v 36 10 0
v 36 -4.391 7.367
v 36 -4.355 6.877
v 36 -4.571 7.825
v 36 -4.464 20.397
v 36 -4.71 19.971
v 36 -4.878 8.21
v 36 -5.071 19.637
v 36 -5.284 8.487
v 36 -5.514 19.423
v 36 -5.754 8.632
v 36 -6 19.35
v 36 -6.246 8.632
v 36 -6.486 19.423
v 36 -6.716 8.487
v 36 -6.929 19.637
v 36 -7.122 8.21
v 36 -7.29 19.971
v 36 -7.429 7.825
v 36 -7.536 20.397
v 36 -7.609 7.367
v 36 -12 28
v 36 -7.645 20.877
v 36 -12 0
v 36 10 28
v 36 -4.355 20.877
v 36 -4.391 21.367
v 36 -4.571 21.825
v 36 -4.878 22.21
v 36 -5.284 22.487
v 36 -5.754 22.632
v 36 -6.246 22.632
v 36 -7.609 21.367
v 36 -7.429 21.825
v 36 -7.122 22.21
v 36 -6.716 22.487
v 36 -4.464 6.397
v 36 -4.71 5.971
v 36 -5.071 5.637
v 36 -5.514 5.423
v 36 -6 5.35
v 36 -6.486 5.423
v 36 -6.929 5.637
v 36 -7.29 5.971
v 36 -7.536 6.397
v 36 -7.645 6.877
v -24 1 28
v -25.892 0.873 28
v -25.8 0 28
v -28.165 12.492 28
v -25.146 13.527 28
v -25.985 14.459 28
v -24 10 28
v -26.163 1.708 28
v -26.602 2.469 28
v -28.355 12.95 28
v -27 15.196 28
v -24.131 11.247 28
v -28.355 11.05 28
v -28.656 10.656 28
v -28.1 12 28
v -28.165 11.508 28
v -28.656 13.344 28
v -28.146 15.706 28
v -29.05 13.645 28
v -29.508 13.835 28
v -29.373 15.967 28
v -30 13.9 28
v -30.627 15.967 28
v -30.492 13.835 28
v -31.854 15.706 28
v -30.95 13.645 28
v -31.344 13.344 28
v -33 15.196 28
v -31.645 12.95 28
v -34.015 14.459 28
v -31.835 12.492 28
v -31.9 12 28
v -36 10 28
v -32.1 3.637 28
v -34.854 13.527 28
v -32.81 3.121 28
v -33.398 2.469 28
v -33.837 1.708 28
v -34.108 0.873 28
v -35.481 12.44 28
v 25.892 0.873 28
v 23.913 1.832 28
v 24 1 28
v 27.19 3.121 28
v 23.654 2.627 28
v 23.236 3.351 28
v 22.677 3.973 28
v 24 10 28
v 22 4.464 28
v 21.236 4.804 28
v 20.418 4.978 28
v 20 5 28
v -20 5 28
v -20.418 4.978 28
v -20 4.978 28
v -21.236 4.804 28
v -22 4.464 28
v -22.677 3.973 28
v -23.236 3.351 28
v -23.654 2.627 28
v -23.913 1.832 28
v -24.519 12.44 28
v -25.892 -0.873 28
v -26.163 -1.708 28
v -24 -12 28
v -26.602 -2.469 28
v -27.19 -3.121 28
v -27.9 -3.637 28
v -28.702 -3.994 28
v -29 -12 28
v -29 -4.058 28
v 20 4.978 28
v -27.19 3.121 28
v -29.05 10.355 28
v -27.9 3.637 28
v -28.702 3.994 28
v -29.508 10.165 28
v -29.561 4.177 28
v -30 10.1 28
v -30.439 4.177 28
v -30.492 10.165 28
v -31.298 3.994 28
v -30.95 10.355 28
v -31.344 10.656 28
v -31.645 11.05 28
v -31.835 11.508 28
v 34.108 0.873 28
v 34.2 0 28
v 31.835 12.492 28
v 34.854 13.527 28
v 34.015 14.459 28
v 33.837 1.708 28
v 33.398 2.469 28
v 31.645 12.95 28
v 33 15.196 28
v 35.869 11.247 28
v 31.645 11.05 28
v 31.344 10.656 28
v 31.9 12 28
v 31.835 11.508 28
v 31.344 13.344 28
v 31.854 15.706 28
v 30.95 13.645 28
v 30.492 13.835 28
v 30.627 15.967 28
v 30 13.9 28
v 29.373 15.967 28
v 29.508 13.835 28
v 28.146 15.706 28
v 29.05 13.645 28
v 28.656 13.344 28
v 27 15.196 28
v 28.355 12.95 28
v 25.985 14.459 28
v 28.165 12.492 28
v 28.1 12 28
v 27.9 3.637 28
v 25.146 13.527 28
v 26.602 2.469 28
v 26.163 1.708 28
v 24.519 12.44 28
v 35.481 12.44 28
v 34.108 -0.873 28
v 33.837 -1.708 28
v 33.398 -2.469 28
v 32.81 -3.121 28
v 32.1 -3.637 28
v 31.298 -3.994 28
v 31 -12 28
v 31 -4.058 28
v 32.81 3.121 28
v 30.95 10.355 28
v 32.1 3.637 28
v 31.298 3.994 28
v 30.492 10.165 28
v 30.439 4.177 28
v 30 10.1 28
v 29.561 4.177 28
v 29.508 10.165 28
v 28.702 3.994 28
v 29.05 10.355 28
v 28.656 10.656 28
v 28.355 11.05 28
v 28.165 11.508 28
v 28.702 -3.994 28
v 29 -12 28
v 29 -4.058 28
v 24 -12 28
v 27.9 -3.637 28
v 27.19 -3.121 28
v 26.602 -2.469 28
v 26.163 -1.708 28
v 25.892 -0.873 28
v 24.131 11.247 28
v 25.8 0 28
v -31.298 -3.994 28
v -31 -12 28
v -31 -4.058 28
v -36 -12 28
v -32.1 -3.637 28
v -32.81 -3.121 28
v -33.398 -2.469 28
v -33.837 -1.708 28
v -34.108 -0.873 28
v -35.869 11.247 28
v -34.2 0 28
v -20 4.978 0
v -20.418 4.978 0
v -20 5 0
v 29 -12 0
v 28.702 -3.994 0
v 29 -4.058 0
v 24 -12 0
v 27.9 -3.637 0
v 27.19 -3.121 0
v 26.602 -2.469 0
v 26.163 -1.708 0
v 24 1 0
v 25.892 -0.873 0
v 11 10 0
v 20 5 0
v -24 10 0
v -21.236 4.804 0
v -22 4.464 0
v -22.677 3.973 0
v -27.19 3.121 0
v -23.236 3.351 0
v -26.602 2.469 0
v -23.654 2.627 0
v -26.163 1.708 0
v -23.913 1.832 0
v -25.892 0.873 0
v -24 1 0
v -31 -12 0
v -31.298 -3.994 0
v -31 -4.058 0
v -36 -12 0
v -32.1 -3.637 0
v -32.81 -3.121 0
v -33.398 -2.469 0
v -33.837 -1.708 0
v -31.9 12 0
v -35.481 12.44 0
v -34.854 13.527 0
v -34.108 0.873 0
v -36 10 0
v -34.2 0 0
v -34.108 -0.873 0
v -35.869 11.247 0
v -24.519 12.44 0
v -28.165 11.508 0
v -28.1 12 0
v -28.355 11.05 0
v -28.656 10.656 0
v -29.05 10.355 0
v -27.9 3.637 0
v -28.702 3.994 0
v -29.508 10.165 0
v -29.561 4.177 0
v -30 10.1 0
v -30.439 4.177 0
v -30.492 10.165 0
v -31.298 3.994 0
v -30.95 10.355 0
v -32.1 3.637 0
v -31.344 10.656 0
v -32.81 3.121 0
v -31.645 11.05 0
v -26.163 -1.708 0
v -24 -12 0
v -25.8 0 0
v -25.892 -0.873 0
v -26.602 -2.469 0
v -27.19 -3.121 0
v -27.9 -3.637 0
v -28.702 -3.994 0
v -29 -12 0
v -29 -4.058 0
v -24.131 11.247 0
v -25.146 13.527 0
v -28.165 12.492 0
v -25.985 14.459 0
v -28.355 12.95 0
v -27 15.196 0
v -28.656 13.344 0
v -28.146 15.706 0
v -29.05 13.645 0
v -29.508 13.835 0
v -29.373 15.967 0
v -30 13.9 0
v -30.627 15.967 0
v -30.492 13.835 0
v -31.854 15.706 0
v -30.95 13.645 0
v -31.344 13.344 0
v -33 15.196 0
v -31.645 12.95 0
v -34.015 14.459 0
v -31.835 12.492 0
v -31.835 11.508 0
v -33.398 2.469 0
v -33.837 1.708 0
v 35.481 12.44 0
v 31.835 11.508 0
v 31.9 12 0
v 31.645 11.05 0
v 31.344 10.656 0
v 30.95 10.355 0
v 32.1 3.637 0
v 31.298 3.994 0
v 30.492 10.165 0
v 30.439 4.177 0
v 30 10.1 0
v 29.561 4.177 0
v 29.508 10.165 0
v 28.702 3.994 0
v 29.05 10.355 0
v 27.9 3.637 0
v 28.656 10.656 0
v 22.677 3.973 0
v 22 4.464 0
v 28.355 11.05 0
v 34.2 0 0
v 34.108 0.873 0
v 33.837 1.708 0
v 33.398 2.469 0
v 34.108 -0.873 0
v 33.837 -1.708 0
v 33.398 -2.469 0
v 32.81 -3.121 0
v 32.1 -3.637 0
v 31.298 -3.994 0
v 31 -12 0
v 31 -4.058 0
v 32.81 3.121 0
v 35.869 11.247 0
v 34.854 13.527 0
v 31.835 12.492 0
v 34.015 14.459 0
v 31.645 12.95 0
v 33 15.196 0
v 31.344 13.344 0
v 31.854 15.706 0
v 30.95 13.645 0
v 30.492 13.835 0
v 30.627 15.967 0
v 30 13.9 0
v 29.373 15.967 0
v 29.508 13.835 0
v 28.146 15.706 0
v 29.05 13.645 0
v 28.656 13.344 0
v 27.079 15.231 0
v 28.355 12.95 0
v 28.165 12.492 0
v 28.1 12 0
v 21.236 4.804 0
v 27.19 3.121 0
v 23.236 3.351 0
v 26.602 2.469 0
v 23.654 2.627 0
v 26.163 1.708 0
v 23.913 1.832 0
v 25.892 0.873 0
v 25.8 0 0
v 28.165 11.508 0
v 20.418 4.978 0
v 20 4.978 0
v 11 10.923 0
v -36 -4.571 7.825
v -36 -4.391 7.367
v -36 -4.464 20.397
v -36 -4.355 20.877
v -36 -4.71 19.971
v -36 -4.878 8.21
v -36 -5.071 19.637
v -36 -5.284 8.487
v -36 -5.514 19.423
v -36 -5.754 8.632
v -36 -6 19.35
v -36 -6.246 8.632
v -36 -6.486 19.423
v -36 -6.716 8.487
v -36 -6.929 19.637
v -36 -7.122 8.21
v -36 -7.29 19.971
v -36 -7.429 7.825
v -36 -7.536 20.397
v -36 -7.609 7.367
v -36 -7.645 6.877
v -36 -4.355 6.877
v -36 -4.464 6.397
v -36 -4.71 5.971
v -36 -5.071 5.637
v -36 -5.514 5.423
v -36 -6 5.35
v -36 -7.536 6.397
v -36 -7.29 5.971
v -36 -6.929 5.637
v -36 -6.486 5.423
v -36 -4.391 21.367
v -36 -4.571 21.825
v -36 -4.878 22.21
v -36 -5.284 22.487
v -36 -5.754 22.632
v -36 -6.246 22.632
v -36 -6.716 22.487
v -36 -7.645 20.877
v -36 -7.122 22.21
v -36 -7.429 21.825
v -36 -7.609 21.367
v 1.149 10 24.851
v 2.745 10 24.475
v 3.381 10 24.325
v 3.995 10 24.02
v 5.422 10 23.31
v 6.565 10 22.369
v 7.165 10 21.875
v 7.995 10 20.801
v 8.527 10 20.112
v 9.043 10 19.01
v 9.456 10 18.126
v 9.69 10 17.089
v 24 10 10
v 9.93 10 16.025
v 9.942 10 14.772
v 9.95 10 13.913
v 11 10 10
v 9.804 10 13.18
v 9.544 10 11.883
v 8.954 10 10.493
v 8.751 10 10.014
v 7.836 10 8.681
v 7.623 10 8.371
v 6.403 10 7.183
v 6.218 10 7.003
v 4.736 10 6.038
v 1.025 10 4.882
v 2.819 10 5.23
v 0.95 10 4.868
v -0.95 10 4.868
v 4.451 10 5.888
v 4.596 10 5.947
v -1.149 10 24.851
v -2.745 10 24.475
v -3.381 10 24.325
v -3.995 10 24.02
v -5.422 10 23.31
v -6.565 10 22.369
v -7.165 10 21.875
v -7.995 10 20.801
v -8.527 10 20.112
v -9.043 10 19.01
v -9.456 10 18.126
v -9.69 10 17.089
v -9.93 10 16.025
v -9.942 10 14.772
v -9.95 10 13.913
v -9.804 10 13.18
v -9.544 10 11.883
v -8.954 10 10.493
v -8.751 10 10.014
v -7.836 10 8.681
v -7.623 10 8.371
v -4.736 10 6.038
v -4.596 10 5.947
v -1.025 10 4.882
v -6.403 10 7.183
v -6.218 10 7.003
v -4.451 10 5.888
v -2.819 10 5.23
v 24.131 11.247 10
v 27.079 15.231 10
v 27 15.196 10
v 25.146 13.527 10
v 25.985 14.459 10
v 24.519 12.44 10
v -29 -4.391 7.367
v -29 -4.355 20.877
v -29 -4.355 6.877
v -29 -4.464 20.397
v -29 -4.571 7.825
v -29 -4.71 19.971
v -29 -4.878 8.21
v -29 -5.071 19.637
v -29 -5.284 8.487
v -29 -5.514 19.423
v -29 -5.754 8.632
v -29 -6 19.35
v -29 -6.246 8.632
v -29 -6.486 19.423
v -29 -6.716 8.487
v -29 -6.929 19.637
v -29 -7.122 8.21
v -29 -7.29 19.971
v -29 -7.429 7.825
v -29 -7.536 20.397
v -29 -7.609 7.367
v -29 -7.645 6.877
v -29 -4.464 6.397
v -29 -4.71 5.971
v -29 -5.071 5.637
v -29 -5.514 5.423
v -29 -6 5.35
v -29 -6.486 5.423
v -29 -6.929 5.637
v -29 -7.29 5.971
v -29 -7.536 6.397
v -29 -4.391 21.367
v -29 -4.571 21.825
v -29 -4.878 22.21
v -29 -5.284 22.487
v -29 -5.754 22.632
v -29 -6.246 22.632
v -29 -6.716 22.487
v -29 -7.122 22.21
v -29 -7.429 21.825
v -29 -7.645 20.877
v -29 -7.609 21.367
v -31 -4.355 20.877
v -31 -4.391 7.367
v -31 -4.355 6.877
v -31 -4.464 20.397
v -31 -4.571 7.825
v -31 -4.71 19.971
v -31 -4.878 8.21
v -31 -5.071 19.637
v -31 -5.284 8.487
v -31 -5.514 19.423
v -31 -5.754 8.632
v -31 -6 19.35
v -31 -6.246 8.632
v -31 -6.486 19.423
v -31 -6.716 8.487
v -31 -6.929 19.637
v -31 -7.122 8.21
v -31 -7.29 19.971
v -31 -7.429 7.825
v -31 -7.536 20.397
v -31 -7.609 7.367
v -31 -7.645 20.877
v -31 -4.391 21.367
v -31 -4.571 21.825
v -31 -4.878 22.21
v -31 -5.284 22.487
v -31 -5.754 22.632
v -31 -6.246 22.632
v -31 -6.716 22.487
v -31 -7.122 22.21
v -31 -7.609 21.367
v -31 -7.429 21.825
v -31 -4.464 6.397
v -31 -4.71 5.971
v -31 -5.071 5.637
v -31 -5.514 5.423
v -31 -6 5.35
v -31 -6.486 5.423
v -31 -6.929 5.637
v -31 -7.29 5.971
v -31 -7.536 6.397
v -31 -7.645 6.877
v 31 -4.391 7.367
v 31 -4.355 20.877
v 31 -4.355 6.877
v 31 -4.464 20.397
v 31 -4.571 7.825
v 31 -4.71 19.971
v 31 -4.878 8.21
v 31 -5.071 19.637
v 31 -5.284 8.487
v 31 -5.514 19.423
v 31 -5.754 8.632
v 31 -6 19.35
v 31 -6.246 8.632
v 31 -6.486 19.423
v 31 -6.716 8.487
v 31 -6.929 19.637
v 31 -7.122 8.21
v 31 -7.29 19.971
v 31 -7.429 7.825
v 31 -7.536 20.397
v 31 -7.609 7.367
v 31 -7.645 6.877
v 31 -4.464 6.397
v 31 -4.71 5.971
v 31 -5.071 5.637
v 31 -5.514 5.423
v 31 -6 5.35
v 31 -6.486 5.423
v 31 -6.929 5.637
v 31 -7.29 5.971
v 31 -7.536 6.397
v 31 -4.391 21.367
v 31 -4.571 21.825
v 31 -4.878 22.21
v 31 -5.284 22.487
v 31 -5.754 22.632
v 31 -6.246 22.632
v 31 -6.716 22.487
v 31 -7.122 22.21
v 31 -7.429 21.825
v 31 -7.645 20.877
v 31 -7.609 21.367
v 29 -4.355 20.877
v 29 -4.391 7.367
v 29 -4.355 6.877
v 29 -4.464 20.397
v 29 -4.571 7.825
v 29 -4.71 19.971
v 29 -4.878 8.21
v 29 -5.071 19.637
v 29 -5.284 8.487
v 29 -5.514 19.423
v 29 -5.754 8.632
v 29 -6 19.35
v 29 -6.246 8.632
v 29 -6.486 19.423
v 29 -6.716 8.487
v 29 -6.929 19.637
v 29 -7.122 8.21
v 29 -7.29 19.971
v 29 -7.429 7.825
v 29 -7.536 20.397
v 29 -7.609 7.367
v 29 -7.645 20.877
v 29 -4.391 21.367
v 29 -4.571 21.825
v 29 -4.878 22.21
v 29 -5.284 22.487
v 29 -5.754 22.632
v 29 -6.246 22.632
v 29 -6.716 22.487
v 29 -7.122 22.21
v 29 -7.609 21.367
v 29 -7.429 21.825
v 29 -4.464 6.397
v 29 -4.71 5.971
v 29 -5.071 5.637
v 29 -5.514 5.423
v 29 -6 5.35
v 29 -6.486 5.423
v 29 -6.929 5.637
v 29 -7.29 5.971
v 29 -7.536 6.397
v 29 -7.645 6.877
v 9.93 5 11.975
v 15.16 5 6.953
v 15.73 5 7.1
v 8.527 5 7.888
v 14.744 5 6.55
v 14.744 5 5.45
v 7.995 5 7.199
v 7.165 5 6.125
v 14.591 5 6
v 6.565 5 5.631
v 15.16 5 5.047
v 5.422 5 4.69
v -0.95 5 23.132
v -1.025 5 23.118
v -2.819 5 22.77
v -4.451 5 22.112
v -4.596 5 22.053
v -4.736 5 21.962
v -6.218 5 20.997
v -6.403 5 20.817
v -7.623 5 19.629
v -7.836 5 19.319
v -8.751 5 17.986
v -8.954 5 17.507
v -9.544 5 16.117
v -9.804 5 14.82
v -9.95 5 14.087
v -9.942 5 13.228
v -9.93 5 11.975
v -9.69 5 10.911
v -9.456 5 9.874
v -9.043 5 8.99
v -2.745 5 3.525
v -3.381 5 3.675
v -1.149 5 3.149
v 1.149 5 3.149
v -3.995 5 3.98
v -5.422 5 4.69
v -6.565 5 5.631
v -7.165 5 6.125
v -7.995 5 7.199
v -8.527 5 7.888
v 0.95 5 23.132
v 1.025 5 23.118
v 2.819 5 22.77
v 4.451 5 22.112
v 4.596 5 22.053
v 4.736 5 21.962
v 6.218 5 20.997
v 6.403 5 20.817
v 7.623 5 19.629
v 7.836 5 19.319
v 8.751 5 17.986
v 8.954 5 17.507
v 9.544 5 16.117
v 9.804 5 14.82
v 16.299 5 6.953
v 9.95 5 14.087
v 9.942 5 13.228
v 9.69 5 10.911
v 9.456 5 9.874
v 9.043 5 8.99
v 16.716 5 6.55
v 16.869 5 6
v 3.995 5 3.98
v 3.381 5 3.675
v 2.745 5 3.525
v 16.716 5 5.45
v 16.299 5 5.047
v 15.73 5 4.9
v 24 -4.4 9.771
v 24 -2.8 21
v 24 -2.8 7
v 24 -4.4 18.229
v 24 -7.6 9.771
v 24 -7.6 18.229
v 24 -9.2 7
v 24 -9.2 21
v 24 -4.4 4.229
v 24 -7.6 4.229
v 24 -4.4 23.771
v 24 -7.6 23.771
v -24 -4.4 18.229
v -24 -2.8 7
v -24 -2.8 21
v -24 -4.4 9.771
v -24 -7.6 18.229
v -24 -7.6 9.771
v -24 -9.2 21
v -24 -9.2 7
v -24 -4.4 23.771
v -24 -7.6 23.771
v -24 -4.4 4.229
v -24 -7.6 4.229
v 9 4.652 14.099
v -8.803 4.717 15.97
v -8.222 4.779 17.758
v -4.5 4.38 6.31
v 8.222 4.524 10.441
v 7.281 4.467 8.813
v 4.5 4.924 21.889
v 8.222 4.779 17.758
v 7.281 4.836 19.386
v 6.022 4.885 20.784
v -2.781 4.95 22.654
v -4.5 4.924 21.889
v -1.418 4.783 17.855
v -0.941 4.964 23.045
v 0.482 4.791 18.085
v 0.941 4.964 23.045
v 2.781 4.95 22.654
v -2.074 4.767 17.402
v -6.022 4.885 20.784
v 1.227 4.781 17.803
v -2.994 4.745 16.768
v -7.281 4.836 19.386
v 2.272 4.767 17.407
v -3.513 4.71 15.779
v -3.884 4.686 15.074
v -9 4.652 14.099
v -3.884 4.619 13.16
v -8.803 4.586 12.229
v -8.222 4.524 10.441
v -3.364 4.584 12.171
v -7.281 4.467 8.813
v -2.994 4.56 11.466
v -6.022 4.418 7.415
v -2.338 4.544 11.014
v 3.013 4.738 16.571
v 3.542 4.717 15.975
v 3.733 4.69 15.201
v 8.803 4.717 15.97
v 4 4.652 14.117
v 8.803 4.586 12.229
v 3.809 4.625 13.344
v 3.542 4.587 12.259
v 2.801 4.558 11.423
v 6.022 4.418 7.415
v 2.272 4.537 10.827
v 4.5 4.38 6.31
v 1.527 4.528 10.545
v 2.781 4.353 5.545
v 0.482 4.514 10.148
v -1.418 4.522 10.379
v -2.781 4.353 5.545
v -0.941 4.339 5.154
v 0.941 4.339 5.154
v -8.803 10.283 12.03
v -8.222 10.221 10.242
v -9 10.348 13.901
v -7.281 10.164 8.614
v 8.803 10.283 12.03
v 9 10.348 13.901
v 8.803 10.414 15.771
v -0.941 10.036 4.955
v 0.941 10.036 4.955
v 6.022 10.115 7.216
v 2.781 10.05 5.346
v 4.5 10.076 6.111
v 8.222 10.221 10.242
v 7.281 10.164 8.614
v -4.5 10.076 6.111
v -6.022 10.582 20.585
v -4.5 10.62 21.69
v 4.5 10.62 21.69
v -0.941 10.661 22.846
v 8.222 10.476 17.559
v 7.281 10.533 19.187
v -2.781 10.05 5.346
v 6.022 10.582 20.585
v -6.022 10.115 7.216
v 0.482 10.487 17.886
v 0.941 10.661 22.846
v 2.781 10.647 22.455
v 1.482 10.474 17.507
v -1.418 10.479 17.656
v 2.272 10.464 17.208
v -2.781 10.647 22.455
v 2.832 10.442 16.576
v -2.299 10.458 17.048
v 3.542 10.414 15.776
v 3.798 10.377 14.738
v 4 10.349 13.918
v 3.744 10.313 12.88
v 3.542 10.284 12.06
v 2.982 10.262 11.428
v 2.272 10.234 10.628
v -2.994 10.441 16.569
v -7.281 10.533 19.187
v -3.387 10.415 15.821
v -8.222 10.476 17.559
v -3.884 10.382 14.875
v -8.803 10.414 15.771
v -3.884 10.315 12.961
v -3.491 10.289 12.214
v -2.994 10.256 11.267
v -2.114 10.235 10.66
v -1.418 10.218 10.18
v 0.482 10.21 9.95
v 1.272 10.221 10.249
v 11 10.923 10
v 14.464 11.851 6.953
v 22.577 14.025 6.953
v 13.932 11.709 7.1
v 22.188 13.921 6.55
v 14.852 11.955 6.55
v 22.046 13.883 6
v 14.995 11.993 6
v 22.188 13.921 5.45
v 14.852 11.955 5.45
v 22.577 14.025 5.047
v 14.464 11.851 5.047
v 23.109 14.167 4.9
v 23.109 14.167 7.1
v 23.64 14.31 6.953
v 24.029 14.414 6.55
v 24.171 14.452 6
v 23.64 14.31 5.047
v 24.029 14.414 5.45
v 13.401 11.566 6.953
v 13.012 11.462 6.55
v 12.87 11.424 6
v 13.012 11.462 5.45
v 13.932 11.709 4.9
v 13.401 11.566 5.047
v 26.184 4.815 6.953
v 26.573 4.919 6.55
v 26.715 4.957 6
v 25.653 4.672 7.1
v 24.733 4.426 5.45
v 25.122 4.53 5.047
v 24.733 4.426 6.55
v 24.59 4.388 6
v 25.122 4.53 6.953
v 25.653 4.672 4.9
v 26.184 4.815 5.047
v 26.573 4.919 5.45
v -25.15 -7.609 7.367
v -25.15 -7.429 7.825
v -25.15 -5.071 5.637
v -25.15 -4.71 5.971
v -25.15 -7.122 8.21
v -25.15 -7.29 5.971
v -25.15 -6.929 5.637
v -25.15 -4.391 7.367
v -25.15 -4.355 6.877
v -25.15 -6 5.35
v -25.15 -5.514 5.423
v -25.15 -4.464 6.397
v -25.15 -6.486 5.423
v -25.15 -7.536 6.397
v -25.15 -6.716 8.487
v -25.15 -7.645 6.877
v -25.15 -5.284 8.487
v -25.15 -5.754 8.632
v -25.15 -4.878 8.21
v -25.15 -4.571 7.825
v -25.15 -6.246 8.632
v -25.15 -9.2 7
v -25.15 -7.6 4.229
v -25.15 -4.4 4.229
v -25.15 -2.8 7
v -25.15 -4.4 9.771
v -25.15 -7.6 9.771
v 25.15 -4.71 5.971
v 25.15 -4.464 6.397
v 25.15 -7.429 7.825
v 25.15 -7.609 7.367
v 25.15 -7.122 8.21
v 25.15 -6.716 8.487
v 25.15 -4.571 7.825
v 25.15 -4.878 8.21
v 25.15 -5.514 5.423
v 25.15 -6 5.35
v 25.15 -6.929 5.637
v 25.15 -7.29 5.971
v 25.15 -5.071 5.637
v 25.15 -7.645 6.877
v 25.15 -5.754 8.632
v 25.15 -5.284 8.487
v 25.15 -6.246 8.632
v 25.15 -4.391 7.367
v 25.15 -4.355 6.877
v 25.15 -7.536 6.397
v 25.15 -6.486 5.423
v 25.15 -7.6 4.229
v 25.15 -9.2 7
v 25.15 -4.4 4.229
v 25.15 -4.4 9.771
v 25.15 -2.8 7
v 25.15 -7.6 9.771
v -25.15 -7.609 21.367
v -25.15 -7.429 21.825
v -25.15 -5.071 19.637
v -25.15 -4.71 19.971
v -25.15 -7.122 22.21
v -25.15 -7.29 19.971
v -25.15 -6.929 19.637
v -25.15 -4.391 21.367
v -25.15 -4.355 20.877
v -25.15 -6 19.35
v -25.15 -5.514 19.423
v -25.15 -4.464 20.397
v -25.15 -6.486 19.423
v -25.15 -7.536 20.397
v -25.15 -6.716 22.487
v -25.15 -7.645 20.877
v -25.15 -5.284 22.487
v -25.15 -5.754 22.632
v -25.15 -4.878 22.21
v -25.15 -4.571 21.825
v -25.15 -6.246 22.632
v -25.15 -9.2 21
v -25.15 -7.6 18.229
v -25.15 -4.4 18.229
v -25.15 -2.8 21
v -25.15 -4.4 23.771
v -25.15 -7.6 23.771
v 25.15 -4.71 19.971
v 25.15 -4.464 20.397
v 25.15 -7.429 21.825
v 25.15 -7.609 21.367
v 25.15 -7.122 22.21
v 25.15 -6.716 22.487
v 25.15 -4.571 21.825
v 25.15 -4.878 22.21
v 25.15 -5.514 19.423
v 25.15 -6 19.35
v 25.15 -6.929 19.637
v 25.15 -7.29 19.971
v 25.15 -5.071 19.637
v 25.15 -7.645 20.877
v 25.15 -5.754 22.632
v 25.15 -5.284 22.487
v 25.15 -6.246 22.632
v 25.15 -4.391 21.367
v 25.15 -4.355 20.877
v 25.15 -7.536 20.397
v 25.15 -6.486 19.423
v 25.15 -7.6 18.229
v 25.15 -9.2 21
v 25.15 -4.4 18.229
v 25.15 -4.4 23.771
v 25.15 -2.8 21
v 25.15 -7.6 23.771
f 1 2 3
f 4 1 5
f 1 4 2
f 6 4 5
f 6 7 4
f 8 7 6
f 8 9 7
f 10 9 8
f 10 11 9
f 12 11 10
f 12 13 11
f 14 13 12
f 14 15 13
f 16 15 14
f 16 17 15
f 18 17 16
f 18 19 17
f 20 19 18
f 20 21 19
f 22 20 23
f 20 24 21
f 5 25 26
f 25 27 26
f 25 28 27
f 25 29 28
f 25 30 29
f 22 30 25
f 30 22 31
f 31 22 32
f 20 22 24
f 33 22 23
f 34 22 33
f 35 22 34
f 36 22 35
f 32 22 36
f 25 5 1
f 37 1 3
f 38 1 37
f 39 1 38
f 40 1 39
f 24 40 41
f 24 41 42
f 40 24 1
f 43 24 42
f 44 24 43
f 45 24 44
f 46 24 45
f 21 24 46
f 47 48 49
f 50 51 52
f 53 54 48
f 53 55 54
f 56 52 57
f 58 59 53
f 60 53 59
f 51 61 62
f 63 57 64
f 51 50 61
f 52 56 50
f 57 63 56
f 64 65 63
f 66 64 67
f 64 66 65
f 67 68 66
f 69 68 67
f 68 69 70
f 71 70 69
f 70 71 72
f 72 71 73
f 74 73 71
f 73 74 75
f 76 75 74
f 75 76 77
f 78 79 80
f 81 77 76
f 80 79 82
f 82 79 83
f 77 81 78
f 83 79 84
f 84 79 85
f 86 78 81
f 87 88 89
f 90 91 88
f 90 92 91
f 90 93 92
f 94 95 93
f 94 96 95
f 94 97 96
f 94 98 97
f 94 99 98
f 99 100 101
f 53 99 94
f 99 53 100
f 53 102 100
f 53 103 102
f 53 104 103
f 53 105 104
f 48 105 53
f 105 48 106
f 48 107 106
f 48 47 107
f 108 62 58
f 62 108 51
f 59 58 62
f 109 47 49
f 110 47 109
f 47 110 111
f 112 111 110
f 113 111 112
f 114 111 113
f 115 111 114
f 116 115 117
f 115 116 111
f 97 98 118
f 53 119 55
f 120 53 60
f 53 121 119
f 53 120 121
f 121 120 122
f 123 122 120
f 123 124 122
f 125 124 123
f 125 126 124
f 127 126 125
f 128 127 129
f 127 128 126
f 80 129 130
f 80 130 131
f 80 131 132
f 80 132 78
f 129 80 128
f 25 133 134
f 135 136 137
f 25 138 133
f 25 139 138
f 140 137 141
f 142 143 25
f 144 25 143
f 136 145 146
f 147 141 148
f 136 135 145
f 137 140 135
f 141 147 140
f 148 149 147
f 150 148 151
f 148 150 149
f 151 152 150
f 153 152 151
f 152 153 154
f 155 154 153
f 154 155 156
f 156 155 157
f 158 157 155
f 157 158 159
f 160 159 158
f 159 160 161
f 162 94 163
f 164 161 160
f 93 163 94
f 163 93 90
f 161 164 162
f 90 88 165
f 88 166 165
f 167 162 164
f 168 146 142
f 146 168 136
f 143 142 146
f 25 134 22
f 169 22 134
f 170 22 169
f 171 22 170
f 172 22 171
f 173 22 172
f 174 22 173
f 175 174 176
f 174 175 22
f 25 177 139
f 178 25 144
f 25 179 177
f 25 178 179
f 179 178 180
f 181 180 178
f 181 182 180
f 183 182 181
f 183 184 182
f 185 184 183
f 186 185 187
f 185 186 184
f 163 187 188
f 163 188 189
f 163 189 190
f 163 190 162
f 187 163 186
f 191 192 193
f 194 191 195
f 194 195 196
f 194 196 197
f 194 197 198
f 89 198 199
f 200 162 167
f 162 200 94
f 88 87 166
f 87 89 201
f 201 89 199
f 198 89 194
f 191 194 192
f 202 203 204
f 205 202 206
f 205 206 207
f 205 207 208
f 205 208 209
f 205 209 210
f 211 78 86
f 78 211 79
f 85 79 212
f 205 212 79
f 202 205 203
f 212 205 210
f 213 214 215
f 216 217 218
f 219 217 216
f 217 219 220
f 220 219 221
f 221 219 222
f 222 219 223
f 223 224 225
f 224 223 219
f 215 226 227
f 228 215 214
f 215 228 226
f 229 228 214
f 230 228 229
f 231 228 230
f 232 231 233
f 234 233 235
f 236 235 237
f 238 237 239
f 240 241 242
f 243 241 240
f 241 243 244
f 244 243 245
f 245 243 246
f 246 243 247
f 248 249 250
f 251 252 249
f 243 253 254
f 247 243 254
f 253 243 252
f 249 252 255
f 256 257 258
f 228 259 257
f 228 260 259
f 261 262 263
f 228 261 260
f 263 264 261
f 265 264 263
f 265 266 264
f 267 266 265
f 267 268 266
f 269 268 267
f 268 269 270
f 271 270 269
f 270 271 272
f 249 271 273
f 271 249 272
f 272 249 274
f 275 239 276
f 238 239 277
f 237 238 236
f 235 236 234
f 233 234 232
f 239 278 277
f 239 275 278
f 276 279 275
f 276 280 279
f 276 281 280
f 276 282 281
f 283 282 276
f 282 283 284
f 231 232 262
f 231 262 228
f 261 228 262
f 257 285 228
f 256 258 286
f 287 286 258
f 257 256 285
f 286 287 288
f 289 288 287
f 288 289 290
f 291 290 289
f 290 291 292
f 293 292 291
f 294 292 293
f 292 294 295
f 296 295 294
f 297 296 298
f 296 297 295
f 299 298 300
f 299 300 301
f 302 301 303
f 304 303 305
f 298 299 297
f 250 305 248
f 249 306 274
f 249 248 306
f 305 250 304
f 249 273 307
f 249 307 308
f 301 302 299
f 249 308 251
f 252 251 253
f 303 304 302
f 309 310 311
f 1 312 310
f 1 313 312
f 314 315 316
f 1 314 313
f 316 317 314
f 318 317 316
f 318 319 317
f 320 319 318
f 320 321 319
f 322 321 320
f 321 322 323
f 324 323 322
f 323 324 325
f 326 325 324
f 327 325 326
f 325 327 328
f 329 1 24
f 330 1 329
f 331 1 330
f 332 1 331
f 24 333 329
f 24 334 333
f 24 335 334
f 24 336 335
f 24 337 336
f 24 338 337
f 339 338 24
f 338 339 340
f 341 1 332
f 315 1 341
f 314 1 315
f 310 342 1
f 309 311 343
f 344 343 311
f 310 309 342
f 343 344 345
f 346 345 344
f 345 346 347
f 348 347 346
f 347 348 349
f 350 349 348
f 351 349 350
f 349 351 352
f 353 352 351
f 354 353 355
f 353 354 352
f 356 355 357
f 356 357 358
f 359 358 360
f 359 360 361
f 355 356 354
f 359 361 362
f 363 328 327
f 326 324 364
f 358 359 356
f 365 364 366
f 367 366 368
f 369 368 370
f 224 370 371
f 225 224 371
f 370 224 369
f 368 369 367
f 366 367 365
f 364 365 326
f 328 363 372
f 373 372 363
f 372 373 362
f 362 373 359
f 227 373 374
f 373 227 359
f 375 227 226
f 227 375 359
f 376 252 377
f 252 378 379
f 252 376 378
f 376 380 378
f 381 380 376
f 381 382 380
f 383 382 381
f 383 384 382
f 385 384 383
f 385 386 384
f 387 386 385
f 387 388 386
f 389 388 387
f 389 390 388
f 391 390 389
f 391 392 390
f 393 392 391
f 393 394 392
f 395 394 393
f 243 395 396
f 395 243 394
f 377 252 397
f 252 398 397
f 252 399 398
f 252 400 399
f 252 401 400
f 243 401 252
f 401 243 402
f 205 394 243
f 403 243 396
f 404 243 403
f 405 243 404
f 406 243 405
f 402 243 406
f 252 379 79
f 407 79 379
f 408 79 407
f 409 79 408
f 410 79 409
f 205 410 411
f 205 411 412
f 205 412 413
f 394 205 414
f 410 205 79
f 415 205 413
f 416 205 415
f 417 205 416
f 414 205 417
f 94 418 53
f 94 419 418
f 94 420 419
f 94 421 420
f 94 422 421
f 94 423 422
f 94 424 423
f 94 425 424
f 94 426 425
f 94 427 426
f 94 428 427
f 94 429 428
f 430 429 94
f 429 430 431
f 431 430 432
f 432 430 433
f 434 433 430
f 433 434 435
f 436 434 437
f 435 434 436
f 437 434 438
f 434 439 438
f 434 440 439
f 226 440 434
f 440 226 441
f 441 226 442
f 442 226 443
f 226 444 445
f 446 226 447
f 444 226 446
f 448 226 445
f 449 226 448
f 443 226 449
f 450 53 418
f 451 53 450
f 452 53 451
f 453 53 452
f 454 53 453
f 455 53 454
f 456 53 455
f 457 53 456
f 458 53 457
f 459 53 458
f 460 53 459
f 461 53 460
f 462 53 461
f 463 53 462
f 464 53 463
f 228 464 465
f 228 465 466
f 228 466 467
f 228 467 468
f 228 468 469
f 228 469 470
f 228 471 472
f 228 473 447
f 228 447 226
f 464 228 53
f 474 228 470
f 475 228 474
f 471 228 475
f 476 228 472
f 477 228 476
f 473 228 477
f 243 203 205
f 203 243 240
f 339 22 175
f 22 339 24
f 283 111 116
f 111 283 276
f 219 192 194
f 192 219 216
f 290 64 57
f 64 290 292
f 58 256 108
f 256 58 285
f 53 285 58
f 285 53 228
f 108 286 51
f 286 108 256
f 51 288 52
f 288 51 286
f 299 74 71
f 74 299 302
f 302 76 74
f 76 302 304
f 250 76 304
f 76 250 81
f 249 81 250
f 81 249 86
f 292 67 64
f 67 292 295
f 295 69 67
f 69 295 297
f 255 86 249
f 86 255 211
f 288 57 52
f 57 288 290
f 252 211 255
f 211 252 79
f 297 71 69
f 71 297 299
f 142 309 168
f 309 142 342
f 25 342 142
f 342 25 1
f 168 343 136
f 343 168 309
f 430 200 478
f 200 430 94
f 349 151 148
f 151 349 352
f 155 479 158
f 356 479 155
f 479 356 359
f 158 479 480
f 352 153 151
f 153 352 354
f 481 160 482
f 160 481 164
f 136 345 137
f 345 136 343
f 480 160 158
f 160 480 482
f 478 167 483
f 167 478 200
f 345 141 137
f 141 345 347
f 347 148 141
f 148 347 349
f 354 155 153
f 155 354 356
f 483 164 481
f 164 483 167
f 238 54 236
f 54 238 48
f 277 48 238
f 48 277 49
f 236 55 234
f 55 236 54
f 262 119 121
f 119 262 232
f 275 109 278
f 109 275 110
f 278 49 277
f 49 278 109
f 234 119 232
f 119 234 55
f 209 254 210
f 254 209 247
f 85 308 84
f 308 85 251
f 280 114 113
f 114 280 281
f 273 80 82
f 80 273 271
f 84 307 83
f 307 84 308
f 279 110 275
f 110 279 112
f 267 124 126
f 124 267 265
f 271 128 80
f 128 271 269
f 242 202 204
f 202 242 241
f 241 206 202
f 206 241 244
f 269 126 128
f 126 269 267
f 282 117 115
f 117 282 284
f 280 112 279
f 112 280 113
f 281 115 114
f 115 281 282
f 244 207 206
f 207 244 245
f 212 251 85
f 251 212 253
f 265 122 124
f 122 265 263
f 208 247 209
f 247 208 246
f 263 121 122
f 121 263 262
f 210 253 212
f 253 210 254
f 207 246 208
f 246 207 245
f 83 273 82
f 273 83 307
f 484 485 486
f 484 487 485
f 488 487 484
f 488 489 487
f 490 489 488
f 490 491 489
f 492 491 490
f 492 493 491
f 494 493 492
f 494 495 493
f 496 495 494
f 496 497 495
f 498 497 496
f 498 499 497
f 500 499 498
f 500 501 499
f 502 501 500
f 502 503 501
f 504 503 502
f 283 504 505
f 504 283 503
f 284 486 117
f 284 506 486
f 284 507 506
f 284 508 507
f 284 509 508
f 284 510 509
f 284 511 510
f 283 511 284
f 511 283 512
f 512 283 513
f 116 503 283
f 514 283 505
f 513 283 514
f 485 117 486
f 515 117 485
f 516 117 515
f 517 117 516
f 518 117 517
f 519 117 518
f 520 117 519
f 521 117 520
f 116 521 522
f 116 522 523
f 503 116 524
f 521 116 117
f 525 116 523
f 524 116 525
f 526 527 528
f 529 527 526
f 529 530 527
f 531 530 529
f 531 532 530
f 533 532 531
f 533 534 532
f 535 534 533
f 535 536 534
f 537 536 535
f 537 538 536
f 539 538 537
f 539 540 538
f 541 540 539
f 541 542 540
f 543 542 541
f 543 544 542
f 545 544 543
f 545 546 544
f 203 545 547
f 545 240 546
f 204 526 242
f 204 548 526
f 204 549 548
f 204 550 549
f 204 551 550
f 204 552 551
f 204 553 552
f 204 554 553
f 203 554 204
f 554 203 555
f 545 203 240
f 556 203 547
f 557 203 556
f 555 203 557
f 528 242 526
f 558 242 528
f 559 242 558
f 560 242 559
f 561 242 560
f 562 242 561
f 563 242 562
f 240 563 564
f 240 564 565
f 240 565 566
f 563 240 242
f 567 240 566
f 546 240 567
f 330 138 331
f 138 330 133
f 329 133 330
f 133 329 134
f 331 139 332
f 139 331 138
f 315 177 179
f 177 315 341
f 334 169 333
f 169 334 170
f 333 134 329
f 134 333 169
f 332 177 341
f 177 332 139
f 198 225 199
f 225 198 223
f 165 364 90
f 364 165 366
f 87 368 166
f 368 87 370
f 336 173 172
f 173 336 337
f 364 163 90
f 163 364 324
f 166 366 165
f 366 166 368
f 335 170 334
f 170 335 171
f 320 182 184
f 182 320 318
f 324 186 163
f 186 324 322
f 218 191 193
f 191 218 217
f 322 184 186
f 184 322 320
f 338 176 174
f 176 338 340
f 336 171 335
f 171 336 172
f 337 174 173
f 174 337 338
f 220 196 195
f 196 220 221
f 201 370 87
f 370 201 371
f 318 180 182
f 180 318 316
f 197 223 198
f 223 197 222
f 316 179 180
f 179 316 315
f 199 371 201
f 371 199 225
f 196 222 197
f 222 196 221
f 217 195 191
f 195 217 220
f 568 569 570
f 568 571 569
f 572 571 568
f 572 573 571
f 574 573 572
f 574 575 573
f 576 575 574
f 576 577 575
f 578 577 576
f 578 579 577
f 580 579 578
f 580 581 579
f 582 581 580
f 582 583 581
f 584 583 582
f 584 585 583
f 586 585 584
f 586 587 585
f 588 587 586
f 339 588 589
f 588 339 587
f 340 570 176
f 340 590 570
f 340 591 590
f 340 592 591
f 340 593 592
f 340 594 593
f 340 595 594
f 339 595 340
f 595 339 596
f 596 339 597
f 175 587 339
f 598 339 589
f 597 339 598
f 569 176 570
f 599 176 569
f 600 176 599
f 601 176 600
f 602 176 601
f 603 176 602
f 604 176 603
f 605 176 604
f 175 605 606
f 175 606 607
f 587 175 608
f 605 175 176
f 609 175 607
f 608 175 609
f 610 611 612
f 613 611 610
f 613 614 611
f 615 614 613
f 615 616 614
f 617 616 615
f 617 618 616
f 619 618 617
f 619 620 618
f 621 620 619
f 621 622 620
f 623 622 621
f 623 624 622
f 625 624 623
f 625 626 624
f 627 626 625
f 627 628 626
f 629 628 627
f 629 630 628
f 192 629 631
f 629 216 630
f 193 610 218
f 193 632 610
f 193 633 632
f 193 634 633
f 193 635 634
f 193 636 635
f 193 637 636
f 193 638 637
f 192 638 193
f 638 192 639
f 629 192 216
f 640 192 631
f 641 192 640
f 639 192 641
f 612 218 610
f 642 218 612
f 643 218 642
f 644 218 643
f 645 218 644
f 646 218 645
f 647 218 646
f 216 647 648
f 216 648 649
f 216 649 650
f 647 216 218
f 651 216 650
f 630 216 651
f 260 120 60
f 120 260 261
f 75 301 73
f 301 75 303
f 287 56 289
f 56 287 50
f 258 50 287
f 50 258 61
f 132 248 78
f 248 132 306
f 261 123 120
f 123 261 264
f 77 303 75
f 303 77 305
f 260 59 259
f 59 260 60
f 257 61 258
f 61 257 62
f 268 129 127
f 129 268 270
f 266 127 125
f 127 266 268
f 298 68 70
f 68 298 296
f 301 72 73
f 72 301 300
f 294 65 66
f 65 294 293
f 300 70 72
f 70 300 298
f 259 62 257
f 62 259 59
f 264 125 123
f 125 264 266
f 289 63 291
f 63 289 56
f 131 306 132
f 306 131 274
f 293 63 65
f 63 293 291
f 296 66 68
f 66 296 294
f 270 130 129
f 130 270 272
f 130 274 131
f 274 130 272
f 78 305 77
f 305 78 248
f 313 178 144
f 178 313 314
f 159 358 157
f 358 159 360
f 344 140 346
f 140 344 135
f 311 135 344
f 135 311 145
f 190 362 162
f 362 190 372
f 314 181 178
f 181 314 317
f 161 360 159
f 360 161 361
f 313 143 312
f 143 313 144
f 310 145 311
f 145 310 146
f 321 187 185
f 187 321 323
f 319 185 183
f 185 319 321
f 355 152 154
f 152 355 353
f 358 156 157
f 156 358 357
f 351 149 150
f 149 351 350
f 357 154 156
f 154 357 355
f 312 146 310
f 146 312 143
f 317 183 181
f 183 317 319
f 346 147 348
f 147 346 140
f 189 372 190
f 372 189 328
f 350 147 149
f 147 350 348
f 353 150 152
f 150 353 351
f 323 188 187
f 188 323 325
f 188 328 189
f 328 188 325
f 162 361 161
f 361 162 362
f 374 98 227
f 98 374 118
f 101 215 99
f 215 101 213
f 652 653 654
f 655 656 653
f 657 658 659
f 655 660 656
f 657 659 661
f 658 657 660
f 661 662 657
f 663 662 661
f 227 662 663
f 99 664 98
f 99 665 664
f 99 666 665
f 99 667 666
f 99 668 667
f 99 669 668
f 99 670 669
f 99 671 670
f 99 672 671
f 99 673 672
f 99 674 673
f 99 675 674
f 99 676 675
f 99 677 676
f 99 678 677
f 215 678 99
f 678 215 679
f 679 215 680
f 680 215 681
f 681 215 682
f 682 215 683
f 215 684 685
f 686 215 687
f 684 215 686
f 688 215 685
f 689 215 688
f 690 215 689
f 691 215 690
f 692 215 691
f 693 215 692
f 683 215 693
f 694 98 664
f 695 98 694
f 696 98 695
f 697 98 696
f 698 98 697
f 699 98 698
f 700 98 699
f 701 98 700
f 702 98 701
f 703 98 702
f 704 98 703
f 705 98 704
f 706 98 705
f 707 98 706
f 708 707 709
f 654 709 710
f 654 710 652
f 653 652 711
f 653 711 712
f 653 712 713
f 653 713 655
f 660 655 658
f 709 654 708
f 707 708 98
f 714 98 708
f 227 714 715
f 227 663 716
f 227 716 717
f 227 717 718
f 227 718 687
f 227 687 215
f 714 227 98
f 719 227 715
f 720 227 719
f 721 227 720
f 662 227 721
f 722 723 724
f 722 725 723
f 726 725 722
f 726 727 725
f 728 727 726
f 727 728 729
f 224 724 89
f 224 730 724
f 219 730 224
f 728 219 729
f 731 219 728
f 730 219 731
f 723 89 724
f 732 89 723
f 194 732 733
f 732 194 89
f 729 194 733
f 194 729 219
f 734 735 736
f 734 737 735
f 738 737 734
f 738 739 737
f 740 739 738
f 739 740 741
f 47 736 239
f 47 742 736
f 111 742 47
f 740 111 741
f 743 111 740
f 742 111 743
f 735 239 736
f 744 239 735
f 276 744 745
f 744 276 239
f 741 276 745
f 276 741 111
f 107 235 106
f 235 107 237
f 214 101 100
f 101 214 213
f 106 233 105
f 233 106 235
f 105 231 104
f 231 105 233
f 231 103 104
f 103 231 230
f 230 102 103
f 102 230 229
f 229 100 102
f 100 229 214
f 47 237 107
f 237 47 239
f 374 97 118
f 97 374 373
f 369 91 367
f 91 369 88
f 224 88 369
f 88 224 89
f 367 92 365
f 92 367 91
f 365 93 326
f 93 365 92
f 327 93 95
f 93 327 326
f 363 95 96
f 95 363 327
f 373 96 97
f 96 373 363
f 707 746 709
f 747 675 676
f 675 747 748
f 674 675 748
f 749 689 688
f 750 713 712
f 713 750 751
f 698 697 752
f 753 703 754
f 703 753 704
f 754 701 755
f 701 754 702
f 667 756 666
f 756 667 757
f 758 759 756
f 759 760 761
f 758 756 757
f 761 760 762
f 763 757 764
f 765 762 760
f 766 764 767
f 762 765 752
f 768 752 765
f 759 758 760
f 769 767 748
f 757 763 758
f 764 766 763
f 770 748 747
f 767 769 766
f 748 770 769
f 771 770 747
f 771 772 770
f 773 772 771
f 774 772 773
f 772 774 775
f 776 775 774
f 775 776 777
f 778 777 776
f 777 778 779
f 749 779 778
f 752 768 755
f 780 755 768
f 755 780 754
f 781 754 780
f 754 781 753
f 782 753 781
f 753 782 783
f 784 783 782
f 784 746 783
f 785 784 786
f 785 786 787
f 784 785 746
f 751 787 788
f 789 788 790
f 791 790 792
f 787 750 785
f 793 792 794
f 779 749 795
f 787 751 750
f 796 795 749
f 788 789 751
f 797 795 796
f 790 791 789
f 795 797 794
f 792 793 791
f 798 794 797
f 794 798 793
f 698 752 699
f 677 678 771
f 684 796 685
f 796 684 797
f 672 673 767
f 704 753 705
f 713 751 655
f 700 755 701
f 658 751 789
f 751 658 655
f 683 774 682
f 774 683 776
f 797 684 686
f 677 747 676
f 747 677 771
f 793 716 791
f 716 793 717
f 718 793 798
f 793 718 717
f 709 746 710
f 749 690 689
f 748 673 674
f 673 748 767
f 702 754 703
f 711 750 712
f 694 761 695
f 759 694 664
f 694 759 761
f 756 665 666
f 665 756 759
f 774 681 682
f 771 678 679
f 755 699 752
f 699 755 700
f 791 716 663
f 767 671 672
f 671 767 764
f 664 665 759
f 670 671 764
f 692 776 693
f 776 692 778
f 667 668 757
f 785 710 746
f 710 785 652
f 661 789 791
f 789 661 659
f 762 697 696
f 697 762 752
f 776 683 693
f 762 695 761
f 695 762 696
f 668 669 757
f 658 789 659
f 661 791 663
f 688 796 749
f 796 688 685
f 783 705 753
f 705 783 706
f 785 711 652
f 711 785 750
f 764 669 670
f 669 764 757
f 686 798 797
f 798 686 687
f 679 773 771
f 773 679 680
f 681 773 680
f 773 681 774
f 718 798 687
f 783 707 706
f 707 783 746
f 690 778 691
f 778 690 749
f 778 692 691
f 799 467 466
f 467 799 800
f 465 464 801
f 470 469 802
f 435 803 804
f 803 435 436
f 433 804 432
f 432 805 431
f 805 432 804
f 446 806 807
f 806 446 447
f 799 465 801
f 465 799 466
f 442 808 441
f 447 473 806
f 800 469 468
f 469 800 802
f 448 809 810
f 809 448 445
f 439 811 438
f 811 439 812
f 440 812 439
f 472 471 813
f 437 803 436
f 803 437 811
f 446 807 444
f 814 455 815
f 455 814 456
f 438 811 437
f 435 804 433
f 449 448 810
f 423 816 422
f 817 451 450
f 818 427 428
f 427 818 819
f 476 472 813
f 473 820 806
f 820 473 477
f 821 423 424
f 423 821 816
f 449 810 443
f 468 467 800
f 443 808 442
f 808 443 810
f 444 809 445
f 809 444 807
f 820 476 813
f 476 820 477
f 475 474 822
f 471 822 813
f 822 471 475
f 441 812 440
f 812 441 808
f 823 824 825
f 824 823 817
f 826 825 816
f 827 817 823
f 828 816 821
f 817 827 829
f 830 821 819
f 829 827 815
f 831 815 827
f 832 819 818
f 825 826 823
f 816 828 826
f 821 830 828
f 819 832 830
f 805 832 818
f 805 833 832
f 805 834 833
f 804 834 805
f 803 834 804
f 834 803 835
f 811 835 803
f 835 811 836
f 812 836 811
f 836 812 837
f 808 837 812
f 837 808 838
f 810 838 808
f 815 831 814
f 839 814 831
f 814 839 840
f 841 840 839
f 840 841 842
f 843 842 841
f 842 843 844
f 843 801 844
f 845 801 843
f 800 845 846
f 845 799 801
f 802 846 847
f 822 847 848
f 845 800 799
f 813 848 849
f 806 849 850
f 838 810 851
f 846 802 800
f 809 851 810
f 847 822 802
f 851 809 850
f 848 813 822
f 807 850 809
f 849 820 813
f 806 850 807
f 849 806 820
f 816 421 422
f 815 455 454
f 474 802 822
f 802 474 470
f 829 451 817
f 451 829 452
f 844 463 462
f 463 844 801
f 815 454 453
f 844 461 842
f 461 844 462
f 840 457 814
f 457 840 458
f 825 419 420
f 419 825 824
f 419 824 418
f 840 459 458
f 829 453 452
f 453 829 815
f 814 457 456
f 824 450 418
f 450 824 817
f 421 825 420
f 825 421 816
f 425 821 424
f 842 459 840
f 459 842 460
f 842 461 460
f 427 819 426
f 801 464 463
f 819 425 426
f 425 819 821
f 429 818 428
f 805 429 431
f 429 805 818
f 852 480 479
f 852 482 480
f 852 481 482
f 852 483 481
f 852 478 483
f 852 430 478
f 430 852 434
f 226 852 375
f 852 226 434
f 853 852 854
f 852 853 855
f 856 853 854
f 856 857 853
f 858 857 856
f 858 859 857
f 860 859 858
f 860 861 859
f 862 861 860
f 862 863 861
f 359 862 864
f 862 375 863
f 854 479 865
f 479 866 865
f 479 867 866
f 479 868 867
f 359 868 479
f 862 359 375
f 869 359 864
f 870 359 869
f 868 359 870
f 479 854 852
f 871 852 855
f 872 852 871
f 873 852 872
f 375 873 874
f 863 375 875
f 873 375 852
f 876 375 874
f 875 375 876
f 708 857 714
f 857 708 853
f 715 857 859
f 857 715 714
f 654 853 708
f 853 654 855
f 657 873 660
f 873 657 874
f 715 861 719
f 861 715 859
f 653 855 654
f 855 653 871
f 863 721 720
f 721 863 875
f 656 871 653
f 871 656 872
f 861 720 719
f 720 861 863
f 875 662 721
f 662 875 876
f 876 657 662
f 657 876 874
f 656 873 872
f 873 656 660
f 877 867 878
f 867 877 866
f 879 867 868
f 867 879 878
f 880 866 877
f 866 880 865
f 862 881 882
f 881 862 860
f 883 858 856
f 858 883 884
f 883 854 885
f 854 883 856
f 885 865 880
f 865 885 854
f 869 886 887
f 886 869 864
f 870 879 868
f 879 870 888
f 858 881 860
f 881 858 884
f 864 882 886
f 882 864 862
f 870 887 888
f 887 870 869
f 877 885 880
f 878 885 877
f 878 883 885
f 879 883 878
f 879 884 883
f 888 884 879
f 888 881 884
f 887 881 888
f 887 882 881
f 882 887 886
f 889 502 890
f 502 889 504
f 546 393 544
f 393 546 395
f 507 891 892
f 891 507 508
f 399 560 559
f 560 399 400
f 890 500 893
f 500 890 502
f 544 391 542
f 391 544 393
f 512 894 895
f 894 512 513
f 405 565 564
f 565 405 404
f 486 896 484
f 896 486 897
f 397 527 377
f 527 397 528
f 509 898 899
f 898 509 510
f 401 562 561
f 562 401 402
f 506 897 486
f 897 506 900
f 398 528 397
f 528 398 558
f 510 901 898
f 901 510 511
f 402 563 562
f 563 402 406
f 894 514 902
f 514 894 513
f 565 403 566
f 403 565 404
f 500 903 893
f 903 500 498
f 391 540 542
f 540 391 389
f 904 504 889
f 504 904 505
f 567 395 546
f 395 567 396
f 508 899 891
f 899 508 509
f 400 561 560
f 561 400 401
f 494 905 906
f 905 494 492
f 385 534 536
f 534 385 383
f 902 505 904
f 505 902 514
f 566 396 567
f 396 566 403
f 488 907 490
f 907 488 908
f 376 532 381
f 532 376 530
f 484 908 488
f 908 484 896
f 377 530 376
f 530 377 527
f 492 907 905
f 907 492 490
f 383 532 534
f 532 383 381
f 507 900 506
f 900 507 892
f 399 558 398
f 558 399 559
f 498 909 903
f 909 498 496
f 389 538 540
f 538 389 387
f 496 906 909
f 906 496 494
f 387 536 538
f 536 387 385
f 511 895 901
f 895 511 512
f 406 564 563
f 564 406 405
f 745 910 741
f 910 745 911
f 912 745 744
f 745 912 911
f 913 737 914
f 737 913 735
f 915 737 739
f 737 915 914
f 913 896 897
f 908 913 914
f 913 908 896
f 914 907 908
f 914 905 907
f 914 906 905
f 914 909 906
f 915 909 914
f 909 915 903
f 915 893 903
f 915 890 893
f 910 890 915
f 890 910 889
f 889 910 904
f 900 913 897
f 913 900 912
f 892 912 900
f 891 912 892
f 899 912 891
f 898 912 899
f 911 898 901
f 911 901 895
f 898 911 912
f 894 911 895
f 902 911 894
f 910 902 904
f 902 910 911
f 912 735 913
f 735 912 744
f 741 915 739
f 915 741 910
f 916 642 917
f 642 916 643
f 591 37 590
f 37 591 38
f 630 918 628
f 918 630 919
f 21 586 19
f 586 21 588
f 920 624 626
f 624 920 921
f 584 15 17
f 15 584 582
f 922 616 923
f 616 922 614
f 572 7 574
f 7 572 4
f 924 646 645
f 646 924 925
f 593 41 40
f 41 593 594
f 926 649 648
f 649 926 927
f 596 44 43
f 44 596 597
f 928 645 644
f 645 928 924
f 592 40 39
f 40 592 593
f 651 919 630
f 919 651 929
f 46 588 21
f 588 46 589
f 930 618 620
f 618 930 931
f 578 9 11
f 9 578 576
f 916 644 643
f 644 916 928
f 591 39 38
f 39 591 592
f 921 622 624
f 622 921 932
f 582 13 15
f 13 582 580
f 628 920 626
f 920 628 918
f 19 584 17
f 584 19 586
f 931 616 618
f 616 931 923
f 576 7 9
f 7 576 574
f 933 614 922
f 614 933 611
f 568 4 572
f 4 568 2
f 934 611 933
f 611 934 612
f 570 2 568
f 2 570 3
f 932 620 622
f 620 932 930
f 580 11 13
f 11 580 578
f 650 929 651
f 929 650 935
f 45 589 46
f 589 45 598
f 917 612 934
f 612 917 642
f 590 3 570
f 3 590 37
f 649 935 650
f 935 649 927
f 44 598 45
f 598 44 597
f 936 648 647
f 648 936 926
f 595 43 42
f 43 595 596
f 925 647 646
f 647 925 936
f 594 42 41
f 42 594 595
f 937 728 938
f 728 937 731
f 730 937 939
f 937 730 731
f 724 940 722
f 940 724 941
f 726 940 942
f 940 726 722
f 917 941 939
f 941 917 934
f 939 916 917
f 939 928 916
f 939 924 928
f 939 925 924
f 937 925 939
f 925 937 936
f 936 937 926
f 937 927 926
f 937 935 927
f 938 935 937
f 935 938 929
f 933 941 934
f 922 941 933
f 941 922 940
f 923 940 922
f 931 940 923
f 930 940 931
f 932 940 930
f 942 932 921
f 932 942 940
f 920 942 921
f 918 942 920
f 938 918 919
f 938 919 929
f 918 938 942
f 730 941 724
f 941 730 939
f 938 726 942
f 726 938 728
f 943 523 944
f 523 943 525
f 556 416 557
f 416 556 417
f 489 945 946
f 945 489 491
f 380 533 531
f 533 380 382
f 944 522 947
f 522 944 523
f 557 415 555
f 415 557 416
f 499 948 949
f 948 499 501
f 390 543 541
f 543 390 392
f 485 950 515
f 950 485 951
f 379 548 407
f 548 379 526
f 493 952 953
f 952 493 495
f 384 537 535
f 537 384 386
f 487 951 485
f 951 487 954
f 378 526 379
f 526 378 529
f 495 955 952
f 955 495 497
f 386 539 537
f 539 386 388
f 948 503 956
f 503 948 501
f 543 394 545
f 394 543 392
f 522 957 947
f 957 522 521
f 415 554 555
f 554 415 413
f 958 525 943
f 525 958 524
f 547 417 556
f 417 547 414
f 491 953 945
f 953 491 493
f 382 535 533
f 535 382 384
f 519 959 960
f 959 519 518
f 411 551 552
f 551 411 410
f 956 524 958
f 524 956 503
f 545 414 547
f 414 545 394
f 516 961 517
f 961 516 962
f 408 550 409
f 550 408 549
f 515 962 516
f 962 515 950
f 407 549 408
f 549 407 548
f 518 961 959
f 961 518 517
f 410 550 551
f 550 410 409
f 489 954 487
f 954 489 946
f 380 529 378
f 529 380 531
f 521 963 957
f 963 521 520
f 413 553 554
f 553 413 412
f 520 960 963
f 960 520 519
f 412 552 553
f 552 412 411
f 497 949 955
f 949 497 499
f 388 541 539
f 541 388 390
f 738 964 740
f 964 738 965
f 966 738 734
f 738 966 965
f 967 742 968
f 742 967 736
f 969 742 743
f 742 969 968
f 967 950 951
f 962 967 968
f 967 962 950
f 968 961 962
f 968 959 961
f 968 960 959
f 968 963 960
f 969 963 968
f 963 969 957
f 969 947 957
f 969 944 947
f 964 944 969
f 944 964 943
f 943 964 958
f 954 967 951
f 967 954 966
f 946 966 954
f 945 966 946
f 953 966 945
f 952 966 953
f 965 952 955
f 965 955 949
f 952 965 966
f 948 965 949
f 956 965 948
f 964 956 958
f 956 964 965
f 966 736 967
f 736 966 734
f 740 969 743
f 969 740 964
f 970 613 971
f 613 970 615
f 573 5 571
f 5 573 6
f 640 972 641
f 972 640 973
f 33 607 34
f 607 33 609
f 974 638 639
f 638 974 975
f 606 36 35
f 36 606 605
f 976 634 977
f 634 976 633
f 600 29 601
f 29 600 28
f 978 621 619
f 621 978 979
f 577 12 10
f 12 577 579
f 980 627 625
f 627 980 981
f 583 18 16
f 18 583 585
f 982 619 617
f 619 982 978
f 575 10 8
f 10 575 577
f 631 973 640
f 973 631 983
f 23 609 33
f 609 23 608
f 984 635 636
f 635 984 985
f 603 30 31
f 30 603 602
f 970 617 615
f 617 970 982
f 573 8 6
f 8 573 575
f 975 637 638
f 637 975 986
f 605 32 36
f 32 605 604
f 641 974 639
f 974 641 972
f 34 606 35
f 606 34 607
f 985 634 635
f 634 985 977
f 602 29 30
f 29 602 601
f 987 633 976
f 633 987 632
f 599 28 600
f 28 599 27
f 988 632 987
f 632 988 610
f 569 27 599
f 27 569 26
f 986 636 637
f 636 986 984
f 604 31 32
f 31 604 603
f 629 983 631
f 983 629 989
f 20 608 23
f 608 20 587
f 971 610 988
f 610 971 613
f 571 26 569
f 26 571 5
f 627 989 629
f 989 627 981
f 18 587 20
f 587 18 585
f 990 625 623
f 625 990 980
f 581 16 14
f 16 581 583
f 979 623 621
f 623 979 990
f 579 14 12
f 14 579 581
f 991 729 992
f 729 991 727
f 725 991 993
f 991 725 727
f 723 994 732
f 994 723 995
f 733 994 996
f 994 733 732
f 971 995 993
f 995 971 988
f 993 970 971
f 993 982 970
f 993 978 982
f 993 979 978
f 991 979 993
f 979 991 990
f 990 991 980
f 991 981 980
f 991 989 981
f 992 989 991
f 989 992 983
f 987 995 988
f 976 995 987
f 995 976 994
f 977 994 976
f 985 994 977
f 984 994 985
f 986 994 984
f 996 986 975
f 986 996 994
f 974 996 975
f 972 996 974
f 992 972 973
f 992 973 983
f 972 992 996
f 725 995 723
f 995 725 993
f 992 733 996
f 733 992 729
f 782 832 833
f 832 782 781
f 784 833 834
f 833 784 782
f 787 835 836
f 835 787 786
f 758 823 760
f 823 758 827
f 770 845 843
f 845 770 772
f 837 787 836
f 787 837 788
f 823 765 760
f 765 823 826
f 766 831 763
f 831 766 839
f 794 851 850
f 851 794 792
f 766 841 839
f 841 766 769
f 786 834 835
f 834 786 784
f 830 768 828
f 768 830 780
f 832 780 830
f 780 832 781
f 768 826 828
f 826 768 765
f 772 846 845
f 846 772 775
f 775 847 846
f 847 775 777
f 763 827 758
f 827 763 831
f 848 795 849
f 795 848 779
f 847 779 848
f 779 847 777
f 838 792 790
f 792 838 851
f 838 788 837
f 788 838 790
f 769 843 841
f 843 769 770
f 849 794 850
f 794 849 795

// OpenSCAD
// file: bracket.scad
$fa = 12;
$fs = 0.5;

w = 60; // Smooth rod distance (center to center)

module screws() {
	for (x = [-w/2, w/2]) {
		translate([x, 0, 0]) {
			// Push-through M3 screw hole.
			translate([0, -6, 0]) rotate([0, 90, 0])
				cylinder(r=1.65, h=20, center=true);
			// M3 nut holder.
			translate([-x/5, -6, 0])
				rotate([30, 0, 0]) rotate([0, 90, 0])
				cylinder(r=3.2, h=2.3, center=true, $fn=6);
		}
	}
}

module bracket(h) {
	difference() {
		union() {
			translate([0, -1, 0]) cube([w+12, 22, h], center=true);
			// Sandwich mount.
			translate([-w/2, 10, 0]) cylinder(r=6, h=h, center=true);
			translate([w/2, 10, 0]) cylinder(r=6, h=h, center=true);
		}
		// Sandwich mount.
		translate([-w/2, 12, 0]) cylinder(r=1.9, h=h+1, center=true);
		translate([w/2, 12, 0]) cylinder(r=1.9, h=h+1, center=true);
		// Smooth rod mounting slots.
		for (x = [-w/2, w/2]) {
			translate([x, 0, 0]) {
				cylinder(r=4.2, h=h+1, center=true);
				translate([0, -10, 0]) cube([2, 20, h+1], center=true);
			}
		}
		// Belt path.
		translate([0, -5, 0]) cube([w-20, 20, h+1], center=true);
		translate([0, -9, 0]) cube([w-12, 20, h+1], center=true);
		translate([-w/2+10, 1, 0]) cylinder(r=4, h=h+1, center=true);
		translate([w/2-10, 1, 0]) cylinder(r=4, h=h+1, center=true);
	}
}

translate([0, 0, 10]) bracket(20);
// main file
use <bracket.scad>;

h = 28; // Total height.
tilt = 2; // Tilt bearings upward (the timing belt is pulling pretty hard).

module bearing_mount() {
	translate([0, 0, 2.3]) cylinder(r1=12, r2=9, h=1.1, center=true);
	translate([0, 0, -2.3]) cylinder(r1=9, r2=12, h=1.1, center=true);
}

x = 17.7; // Micro switch center.
y = 16; // Micro switch center.

module idler_end() {
	difference() {
		union() {
			bracket(h);
			translate([0, 7.5, 0]) rotate([90 - tilt]) bearing_mount();
			// Micro switch placeholder.
			% translate([x, y, -h/2+4]) rotate([0, 0, 15])
				  cube([19.6, 6.34, 10.2], center=true);
			difference() {
				translate([20, 11.88, -h/2+5])
					cube([18, 8, 10], center=true);
				translate([x, y, -h/2+4]) rotate([0, 0, 15])
				  cube([30, 6.34, 20], center=true);
				translate([30, 12, -h/2+5])
					cylinder(r=3, h=20, center=true);
			}
		}
		translate([x, y, -h/2+6]) rotate([0, 0, 15]) {
			translate([-9.5/2, 0, 0]) rotate([90])
				# cylinder(r=1.1, h=26, center=true, $fn=12);
			translate([9.5/2, 0, 0]) rotate([90])
				# cylinder(r=1.1, h=26, center=true, $fn=12);
		}
		translate([0, 8, 0]) rotate([90 - tilt])
			cylinder(r=4, h=40, center=true);
		for (z = [-7, 7]) {
			translate([0, 0, z]) screws();
		}
	}
}

translate([0, 0, h/2]) idler_end();
